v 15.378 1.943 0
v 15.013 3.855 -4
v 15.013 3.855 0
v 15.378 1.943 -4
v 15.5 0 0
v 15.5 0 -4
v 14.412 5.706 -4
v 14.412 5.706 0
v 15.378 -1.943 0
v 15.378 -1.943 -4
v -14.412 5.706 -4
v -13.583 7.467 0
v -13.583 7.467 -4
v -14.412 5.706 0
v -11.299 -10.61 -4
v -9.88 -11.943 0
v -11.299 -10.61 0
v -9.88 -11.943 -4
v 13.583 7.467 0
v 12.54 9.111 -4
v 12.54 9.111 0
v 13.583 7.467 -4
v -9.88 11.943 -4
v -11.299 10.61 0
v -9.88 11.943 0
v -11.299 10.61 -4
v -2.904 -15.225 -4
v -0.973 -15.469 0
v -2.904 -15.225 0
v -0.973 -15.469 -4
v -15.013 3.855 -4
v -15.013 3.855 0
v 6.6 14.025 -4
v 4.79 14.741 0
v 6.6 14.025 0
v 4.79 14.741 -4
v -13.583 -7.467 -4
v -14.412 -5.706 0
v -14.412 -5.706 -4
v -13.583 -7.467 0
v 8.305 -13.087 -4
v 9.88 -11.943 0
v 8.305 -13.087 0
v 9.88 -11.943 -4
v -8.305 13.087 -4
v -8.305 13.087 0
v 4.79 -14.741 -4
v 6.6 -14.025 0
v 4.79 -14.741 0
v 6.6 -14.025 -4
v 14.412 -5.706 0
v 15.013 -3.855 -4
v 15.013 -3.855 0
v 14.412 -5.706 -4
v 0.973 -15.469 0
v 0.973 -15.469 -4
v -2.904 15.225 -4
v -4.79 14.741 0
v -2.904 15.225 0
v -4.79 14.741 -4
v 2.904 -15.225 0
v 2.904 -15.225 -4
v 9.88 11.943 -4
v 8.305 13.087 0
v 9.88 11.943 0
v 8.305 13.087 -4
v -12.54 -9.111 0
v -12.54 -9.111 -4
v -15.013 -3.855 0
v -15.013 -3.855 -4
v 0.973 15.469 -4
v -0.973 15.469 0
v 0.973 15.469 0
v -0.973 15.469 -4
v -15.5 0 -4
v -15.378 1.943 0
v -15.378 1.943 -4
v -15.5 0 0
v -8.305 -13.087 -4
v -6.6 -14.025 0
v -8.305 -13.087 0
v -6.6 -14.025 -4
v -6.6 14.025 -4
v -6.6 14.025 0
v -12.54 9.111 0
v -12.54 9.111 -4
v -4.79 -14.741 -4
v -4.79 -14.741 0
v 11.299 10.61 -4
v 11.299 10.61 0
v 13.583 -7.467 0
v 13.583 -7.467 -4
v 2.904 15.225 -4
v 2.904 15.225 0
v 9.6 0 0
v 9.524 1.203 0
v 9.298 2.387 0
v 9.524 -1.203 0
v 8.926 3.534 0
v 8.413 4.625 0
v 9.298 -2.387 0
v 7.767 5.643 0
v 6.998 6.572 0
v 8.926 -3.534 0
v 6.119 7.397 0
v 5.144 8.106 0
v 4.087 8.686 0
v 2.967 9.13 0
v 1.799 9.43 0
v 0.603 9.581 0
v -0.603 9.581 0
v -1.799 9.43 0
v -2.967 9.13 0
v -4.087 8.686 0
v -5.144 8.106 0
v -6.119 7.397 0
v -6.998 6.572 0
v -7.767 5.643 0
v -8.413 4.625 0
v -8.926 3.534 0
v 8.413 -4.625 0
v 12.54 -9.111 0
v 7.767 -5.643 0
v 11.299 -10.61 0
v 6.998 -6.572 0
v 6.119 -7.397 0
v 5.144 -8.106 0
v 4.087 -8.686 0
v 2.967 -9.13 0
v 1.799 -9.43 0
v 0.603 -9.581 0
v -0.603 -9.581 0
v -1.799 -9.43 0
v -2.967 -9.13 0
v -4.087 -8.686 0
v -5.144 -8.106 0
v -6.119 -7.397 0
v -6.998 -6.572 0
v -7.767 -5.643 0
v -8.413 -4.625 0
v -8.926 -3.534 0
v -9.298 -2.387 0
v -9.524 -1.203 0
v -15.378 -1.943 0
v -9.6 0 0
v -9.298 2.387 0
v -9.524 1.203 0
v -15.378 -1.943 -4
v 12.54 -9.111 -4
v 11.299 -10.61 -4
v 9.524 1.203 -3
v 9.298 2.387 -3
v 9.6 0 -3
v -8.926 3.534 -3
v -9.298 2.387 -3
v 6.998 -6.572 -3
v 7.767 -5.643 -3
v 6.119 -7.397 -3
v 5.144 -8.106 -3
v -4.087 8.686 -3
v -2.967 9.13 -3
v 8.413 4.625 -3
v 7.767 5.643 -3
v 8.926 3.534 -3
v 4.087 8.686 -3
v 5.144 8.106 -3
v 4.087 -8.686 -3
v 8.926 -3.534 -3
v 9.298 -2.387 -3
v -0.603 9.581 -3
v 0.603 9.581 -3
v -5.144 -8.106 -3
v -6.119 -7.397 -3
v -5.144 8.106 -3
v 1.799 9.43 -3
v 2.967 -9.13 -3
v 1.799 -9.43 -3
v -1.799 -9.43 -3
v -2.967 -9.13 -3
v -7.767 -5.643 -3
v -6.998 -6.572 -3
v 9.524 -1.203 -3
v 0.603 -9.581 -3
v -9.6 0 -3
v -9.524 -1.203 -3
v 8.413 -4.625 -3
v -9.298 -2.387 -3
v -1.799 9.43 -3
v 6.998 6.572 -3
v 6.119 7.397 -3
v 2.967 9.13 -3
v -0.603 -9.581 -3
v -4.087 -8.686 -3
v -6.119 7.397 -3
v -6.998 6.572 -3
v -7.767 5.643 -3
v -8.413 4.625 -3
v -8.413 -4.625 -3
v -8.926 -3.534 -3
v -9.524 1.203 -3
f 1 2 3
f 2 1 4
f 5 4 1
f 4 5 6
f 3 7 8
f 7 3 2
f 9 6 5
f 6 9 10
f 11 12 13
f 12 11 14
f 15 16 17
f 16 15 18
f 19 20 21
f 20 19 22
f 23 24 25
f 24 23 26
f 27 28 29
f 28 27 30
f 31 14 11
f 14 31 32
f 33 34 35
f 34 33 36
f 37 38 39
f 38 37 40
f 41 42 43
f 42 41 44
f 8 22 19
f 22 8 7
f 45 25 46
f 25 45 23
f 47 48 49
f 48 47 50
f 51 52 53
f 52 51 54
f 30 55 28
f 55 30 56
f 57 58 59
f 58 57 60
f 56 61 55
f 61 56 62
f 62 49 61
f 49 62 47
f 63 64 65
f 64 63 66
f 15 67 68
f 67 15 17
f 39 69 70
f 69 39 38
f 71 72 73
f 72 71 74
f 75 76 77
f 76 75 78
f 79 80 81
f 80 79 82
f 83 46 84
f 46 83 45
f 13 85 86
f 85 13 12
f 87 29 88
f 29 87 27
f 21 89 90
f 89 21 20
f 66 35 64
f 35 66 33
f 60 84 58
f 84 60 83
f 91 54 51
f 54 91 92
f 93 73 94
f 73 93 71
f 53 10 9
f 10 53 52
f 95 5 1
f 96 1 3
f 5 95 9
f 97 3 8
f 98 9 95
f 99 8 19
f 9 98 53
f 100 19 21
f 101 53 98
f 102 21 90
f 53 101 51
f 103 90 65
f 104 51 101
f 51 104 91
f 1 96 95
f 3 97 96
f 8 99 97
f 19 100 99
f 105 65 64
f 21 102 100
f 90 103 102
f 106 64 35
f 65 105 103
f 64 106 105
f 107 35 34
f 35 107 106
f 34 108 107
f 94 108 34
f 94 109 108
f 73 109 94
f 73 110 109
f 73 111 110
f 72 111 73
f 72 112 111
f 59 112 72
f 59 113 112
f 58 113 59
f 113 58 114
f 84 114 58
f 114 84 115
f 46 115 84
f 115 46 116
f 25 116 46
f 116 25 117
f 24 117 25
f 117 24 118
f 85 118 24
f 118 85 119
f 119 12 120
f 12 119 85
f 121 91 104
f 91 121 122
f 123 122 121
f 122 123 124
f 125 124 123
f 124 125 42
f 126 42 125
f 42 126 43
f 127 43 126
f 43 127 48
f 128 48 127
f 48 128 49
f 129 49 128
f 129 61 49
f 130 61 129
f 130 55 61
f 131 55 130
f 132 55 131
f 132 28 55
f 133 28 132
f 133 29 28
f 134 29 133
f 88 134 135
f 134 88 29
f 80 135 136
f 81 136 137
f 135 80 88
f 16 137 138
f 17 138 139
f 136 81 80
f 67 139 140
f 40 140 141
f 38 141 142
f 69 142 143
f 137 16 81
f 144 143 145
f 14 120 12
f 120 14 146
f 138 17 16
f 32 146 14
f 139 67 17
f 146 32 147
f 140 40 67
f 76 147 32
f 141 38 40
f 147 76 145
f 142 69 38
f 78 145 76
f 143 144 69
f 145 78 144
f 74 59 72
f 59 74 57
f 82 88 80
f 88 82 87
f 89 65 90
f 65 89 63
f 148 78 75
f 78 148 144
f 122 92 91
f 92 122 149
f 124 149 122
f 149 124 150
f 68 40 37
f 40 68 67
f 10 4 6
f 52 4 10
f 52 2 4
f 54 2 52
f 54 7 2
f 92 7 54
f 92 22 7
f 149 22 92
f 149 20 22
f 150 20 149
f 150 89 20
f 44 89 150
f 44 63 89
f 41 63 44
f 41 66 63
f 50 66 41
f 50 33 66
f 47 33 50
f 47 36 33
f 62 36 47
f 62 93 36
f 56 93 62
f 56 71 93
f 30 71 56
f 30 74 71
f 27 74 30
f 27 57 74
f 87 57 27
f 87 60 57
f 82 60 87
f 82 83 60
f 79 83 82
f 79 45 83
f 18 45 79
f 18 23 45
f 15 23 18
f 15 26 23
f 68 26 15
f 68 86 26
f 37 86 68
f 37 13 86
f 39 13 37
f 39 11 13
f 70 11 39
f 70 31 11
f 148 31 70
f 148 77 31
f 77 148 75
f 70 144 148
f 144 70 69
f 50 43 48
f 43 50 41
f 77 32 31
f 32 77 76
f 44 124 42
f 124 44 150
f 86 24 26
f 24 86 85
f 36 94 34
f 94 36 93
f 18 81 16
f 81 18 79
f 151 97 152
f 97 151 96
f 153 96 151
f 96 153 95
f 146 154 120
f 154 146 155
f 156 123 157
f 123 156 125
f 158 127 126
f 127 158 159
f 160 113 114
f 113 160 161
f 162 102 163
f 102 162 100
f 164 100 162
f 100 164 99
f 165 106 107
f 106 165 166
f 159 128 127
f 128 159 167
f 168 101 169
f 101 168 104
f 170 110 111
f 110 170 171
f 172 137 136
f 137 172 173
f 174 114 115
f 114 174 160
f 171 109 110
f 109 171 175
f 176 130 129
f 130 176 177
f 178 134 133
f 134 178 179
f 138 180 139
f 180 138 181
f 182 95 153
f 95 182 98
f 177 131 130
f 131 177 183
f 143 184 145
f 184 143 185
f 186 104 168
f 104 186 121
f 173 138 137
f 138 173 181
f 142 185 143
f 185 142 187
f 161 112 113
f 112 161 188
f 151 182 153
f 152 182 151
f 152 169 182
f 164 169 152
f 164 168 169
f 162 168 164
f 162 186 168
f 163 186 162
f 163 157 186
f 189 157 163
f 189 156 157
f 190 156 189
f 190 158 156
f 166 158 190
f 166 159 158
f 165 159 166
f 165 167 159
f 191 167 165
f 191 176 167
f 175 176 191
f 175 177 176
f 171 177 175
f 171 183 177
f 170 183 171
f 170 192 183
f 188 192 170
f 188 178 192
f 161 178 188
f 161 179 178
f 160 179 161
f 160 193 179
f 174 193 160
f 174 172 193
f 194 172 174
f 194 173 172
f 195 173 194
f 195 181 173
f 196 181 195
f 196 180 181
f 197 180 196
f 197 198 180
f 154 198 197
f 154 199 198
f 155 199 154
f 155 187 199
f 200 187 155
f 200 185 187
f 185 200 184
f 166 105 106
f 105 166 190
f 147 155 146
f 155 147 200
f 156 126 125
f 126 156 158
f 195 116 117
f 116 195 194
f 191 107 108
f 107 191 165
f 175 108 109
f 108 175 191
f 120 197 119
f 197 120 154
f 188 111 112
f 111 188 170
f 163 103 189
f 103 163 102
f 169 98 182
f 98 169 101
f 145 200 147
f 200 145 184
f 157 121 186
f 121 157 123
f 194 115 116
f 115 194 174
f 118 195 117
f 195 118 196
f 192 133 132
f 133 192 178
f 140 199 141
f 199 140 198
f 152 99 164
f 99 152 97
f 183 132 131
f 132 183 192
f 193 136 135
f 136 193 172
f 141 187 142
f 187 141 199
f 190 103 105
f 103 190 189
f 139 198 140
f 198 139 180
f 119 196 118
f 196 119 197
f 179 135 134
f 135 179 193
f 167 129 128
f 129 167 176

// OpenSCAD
$fn = 50;


difference() {
	union() {
		translate(v = [0, 0, -4.0000000000]) {
			cylinder(h = 4, r = 15.5000000000);
		}
	}
	union() {
		#translate(v = [0, 0, -3.0000000000]) {
			cylinder(h = 3, r = 9.6000000000);
		}
	}
}
